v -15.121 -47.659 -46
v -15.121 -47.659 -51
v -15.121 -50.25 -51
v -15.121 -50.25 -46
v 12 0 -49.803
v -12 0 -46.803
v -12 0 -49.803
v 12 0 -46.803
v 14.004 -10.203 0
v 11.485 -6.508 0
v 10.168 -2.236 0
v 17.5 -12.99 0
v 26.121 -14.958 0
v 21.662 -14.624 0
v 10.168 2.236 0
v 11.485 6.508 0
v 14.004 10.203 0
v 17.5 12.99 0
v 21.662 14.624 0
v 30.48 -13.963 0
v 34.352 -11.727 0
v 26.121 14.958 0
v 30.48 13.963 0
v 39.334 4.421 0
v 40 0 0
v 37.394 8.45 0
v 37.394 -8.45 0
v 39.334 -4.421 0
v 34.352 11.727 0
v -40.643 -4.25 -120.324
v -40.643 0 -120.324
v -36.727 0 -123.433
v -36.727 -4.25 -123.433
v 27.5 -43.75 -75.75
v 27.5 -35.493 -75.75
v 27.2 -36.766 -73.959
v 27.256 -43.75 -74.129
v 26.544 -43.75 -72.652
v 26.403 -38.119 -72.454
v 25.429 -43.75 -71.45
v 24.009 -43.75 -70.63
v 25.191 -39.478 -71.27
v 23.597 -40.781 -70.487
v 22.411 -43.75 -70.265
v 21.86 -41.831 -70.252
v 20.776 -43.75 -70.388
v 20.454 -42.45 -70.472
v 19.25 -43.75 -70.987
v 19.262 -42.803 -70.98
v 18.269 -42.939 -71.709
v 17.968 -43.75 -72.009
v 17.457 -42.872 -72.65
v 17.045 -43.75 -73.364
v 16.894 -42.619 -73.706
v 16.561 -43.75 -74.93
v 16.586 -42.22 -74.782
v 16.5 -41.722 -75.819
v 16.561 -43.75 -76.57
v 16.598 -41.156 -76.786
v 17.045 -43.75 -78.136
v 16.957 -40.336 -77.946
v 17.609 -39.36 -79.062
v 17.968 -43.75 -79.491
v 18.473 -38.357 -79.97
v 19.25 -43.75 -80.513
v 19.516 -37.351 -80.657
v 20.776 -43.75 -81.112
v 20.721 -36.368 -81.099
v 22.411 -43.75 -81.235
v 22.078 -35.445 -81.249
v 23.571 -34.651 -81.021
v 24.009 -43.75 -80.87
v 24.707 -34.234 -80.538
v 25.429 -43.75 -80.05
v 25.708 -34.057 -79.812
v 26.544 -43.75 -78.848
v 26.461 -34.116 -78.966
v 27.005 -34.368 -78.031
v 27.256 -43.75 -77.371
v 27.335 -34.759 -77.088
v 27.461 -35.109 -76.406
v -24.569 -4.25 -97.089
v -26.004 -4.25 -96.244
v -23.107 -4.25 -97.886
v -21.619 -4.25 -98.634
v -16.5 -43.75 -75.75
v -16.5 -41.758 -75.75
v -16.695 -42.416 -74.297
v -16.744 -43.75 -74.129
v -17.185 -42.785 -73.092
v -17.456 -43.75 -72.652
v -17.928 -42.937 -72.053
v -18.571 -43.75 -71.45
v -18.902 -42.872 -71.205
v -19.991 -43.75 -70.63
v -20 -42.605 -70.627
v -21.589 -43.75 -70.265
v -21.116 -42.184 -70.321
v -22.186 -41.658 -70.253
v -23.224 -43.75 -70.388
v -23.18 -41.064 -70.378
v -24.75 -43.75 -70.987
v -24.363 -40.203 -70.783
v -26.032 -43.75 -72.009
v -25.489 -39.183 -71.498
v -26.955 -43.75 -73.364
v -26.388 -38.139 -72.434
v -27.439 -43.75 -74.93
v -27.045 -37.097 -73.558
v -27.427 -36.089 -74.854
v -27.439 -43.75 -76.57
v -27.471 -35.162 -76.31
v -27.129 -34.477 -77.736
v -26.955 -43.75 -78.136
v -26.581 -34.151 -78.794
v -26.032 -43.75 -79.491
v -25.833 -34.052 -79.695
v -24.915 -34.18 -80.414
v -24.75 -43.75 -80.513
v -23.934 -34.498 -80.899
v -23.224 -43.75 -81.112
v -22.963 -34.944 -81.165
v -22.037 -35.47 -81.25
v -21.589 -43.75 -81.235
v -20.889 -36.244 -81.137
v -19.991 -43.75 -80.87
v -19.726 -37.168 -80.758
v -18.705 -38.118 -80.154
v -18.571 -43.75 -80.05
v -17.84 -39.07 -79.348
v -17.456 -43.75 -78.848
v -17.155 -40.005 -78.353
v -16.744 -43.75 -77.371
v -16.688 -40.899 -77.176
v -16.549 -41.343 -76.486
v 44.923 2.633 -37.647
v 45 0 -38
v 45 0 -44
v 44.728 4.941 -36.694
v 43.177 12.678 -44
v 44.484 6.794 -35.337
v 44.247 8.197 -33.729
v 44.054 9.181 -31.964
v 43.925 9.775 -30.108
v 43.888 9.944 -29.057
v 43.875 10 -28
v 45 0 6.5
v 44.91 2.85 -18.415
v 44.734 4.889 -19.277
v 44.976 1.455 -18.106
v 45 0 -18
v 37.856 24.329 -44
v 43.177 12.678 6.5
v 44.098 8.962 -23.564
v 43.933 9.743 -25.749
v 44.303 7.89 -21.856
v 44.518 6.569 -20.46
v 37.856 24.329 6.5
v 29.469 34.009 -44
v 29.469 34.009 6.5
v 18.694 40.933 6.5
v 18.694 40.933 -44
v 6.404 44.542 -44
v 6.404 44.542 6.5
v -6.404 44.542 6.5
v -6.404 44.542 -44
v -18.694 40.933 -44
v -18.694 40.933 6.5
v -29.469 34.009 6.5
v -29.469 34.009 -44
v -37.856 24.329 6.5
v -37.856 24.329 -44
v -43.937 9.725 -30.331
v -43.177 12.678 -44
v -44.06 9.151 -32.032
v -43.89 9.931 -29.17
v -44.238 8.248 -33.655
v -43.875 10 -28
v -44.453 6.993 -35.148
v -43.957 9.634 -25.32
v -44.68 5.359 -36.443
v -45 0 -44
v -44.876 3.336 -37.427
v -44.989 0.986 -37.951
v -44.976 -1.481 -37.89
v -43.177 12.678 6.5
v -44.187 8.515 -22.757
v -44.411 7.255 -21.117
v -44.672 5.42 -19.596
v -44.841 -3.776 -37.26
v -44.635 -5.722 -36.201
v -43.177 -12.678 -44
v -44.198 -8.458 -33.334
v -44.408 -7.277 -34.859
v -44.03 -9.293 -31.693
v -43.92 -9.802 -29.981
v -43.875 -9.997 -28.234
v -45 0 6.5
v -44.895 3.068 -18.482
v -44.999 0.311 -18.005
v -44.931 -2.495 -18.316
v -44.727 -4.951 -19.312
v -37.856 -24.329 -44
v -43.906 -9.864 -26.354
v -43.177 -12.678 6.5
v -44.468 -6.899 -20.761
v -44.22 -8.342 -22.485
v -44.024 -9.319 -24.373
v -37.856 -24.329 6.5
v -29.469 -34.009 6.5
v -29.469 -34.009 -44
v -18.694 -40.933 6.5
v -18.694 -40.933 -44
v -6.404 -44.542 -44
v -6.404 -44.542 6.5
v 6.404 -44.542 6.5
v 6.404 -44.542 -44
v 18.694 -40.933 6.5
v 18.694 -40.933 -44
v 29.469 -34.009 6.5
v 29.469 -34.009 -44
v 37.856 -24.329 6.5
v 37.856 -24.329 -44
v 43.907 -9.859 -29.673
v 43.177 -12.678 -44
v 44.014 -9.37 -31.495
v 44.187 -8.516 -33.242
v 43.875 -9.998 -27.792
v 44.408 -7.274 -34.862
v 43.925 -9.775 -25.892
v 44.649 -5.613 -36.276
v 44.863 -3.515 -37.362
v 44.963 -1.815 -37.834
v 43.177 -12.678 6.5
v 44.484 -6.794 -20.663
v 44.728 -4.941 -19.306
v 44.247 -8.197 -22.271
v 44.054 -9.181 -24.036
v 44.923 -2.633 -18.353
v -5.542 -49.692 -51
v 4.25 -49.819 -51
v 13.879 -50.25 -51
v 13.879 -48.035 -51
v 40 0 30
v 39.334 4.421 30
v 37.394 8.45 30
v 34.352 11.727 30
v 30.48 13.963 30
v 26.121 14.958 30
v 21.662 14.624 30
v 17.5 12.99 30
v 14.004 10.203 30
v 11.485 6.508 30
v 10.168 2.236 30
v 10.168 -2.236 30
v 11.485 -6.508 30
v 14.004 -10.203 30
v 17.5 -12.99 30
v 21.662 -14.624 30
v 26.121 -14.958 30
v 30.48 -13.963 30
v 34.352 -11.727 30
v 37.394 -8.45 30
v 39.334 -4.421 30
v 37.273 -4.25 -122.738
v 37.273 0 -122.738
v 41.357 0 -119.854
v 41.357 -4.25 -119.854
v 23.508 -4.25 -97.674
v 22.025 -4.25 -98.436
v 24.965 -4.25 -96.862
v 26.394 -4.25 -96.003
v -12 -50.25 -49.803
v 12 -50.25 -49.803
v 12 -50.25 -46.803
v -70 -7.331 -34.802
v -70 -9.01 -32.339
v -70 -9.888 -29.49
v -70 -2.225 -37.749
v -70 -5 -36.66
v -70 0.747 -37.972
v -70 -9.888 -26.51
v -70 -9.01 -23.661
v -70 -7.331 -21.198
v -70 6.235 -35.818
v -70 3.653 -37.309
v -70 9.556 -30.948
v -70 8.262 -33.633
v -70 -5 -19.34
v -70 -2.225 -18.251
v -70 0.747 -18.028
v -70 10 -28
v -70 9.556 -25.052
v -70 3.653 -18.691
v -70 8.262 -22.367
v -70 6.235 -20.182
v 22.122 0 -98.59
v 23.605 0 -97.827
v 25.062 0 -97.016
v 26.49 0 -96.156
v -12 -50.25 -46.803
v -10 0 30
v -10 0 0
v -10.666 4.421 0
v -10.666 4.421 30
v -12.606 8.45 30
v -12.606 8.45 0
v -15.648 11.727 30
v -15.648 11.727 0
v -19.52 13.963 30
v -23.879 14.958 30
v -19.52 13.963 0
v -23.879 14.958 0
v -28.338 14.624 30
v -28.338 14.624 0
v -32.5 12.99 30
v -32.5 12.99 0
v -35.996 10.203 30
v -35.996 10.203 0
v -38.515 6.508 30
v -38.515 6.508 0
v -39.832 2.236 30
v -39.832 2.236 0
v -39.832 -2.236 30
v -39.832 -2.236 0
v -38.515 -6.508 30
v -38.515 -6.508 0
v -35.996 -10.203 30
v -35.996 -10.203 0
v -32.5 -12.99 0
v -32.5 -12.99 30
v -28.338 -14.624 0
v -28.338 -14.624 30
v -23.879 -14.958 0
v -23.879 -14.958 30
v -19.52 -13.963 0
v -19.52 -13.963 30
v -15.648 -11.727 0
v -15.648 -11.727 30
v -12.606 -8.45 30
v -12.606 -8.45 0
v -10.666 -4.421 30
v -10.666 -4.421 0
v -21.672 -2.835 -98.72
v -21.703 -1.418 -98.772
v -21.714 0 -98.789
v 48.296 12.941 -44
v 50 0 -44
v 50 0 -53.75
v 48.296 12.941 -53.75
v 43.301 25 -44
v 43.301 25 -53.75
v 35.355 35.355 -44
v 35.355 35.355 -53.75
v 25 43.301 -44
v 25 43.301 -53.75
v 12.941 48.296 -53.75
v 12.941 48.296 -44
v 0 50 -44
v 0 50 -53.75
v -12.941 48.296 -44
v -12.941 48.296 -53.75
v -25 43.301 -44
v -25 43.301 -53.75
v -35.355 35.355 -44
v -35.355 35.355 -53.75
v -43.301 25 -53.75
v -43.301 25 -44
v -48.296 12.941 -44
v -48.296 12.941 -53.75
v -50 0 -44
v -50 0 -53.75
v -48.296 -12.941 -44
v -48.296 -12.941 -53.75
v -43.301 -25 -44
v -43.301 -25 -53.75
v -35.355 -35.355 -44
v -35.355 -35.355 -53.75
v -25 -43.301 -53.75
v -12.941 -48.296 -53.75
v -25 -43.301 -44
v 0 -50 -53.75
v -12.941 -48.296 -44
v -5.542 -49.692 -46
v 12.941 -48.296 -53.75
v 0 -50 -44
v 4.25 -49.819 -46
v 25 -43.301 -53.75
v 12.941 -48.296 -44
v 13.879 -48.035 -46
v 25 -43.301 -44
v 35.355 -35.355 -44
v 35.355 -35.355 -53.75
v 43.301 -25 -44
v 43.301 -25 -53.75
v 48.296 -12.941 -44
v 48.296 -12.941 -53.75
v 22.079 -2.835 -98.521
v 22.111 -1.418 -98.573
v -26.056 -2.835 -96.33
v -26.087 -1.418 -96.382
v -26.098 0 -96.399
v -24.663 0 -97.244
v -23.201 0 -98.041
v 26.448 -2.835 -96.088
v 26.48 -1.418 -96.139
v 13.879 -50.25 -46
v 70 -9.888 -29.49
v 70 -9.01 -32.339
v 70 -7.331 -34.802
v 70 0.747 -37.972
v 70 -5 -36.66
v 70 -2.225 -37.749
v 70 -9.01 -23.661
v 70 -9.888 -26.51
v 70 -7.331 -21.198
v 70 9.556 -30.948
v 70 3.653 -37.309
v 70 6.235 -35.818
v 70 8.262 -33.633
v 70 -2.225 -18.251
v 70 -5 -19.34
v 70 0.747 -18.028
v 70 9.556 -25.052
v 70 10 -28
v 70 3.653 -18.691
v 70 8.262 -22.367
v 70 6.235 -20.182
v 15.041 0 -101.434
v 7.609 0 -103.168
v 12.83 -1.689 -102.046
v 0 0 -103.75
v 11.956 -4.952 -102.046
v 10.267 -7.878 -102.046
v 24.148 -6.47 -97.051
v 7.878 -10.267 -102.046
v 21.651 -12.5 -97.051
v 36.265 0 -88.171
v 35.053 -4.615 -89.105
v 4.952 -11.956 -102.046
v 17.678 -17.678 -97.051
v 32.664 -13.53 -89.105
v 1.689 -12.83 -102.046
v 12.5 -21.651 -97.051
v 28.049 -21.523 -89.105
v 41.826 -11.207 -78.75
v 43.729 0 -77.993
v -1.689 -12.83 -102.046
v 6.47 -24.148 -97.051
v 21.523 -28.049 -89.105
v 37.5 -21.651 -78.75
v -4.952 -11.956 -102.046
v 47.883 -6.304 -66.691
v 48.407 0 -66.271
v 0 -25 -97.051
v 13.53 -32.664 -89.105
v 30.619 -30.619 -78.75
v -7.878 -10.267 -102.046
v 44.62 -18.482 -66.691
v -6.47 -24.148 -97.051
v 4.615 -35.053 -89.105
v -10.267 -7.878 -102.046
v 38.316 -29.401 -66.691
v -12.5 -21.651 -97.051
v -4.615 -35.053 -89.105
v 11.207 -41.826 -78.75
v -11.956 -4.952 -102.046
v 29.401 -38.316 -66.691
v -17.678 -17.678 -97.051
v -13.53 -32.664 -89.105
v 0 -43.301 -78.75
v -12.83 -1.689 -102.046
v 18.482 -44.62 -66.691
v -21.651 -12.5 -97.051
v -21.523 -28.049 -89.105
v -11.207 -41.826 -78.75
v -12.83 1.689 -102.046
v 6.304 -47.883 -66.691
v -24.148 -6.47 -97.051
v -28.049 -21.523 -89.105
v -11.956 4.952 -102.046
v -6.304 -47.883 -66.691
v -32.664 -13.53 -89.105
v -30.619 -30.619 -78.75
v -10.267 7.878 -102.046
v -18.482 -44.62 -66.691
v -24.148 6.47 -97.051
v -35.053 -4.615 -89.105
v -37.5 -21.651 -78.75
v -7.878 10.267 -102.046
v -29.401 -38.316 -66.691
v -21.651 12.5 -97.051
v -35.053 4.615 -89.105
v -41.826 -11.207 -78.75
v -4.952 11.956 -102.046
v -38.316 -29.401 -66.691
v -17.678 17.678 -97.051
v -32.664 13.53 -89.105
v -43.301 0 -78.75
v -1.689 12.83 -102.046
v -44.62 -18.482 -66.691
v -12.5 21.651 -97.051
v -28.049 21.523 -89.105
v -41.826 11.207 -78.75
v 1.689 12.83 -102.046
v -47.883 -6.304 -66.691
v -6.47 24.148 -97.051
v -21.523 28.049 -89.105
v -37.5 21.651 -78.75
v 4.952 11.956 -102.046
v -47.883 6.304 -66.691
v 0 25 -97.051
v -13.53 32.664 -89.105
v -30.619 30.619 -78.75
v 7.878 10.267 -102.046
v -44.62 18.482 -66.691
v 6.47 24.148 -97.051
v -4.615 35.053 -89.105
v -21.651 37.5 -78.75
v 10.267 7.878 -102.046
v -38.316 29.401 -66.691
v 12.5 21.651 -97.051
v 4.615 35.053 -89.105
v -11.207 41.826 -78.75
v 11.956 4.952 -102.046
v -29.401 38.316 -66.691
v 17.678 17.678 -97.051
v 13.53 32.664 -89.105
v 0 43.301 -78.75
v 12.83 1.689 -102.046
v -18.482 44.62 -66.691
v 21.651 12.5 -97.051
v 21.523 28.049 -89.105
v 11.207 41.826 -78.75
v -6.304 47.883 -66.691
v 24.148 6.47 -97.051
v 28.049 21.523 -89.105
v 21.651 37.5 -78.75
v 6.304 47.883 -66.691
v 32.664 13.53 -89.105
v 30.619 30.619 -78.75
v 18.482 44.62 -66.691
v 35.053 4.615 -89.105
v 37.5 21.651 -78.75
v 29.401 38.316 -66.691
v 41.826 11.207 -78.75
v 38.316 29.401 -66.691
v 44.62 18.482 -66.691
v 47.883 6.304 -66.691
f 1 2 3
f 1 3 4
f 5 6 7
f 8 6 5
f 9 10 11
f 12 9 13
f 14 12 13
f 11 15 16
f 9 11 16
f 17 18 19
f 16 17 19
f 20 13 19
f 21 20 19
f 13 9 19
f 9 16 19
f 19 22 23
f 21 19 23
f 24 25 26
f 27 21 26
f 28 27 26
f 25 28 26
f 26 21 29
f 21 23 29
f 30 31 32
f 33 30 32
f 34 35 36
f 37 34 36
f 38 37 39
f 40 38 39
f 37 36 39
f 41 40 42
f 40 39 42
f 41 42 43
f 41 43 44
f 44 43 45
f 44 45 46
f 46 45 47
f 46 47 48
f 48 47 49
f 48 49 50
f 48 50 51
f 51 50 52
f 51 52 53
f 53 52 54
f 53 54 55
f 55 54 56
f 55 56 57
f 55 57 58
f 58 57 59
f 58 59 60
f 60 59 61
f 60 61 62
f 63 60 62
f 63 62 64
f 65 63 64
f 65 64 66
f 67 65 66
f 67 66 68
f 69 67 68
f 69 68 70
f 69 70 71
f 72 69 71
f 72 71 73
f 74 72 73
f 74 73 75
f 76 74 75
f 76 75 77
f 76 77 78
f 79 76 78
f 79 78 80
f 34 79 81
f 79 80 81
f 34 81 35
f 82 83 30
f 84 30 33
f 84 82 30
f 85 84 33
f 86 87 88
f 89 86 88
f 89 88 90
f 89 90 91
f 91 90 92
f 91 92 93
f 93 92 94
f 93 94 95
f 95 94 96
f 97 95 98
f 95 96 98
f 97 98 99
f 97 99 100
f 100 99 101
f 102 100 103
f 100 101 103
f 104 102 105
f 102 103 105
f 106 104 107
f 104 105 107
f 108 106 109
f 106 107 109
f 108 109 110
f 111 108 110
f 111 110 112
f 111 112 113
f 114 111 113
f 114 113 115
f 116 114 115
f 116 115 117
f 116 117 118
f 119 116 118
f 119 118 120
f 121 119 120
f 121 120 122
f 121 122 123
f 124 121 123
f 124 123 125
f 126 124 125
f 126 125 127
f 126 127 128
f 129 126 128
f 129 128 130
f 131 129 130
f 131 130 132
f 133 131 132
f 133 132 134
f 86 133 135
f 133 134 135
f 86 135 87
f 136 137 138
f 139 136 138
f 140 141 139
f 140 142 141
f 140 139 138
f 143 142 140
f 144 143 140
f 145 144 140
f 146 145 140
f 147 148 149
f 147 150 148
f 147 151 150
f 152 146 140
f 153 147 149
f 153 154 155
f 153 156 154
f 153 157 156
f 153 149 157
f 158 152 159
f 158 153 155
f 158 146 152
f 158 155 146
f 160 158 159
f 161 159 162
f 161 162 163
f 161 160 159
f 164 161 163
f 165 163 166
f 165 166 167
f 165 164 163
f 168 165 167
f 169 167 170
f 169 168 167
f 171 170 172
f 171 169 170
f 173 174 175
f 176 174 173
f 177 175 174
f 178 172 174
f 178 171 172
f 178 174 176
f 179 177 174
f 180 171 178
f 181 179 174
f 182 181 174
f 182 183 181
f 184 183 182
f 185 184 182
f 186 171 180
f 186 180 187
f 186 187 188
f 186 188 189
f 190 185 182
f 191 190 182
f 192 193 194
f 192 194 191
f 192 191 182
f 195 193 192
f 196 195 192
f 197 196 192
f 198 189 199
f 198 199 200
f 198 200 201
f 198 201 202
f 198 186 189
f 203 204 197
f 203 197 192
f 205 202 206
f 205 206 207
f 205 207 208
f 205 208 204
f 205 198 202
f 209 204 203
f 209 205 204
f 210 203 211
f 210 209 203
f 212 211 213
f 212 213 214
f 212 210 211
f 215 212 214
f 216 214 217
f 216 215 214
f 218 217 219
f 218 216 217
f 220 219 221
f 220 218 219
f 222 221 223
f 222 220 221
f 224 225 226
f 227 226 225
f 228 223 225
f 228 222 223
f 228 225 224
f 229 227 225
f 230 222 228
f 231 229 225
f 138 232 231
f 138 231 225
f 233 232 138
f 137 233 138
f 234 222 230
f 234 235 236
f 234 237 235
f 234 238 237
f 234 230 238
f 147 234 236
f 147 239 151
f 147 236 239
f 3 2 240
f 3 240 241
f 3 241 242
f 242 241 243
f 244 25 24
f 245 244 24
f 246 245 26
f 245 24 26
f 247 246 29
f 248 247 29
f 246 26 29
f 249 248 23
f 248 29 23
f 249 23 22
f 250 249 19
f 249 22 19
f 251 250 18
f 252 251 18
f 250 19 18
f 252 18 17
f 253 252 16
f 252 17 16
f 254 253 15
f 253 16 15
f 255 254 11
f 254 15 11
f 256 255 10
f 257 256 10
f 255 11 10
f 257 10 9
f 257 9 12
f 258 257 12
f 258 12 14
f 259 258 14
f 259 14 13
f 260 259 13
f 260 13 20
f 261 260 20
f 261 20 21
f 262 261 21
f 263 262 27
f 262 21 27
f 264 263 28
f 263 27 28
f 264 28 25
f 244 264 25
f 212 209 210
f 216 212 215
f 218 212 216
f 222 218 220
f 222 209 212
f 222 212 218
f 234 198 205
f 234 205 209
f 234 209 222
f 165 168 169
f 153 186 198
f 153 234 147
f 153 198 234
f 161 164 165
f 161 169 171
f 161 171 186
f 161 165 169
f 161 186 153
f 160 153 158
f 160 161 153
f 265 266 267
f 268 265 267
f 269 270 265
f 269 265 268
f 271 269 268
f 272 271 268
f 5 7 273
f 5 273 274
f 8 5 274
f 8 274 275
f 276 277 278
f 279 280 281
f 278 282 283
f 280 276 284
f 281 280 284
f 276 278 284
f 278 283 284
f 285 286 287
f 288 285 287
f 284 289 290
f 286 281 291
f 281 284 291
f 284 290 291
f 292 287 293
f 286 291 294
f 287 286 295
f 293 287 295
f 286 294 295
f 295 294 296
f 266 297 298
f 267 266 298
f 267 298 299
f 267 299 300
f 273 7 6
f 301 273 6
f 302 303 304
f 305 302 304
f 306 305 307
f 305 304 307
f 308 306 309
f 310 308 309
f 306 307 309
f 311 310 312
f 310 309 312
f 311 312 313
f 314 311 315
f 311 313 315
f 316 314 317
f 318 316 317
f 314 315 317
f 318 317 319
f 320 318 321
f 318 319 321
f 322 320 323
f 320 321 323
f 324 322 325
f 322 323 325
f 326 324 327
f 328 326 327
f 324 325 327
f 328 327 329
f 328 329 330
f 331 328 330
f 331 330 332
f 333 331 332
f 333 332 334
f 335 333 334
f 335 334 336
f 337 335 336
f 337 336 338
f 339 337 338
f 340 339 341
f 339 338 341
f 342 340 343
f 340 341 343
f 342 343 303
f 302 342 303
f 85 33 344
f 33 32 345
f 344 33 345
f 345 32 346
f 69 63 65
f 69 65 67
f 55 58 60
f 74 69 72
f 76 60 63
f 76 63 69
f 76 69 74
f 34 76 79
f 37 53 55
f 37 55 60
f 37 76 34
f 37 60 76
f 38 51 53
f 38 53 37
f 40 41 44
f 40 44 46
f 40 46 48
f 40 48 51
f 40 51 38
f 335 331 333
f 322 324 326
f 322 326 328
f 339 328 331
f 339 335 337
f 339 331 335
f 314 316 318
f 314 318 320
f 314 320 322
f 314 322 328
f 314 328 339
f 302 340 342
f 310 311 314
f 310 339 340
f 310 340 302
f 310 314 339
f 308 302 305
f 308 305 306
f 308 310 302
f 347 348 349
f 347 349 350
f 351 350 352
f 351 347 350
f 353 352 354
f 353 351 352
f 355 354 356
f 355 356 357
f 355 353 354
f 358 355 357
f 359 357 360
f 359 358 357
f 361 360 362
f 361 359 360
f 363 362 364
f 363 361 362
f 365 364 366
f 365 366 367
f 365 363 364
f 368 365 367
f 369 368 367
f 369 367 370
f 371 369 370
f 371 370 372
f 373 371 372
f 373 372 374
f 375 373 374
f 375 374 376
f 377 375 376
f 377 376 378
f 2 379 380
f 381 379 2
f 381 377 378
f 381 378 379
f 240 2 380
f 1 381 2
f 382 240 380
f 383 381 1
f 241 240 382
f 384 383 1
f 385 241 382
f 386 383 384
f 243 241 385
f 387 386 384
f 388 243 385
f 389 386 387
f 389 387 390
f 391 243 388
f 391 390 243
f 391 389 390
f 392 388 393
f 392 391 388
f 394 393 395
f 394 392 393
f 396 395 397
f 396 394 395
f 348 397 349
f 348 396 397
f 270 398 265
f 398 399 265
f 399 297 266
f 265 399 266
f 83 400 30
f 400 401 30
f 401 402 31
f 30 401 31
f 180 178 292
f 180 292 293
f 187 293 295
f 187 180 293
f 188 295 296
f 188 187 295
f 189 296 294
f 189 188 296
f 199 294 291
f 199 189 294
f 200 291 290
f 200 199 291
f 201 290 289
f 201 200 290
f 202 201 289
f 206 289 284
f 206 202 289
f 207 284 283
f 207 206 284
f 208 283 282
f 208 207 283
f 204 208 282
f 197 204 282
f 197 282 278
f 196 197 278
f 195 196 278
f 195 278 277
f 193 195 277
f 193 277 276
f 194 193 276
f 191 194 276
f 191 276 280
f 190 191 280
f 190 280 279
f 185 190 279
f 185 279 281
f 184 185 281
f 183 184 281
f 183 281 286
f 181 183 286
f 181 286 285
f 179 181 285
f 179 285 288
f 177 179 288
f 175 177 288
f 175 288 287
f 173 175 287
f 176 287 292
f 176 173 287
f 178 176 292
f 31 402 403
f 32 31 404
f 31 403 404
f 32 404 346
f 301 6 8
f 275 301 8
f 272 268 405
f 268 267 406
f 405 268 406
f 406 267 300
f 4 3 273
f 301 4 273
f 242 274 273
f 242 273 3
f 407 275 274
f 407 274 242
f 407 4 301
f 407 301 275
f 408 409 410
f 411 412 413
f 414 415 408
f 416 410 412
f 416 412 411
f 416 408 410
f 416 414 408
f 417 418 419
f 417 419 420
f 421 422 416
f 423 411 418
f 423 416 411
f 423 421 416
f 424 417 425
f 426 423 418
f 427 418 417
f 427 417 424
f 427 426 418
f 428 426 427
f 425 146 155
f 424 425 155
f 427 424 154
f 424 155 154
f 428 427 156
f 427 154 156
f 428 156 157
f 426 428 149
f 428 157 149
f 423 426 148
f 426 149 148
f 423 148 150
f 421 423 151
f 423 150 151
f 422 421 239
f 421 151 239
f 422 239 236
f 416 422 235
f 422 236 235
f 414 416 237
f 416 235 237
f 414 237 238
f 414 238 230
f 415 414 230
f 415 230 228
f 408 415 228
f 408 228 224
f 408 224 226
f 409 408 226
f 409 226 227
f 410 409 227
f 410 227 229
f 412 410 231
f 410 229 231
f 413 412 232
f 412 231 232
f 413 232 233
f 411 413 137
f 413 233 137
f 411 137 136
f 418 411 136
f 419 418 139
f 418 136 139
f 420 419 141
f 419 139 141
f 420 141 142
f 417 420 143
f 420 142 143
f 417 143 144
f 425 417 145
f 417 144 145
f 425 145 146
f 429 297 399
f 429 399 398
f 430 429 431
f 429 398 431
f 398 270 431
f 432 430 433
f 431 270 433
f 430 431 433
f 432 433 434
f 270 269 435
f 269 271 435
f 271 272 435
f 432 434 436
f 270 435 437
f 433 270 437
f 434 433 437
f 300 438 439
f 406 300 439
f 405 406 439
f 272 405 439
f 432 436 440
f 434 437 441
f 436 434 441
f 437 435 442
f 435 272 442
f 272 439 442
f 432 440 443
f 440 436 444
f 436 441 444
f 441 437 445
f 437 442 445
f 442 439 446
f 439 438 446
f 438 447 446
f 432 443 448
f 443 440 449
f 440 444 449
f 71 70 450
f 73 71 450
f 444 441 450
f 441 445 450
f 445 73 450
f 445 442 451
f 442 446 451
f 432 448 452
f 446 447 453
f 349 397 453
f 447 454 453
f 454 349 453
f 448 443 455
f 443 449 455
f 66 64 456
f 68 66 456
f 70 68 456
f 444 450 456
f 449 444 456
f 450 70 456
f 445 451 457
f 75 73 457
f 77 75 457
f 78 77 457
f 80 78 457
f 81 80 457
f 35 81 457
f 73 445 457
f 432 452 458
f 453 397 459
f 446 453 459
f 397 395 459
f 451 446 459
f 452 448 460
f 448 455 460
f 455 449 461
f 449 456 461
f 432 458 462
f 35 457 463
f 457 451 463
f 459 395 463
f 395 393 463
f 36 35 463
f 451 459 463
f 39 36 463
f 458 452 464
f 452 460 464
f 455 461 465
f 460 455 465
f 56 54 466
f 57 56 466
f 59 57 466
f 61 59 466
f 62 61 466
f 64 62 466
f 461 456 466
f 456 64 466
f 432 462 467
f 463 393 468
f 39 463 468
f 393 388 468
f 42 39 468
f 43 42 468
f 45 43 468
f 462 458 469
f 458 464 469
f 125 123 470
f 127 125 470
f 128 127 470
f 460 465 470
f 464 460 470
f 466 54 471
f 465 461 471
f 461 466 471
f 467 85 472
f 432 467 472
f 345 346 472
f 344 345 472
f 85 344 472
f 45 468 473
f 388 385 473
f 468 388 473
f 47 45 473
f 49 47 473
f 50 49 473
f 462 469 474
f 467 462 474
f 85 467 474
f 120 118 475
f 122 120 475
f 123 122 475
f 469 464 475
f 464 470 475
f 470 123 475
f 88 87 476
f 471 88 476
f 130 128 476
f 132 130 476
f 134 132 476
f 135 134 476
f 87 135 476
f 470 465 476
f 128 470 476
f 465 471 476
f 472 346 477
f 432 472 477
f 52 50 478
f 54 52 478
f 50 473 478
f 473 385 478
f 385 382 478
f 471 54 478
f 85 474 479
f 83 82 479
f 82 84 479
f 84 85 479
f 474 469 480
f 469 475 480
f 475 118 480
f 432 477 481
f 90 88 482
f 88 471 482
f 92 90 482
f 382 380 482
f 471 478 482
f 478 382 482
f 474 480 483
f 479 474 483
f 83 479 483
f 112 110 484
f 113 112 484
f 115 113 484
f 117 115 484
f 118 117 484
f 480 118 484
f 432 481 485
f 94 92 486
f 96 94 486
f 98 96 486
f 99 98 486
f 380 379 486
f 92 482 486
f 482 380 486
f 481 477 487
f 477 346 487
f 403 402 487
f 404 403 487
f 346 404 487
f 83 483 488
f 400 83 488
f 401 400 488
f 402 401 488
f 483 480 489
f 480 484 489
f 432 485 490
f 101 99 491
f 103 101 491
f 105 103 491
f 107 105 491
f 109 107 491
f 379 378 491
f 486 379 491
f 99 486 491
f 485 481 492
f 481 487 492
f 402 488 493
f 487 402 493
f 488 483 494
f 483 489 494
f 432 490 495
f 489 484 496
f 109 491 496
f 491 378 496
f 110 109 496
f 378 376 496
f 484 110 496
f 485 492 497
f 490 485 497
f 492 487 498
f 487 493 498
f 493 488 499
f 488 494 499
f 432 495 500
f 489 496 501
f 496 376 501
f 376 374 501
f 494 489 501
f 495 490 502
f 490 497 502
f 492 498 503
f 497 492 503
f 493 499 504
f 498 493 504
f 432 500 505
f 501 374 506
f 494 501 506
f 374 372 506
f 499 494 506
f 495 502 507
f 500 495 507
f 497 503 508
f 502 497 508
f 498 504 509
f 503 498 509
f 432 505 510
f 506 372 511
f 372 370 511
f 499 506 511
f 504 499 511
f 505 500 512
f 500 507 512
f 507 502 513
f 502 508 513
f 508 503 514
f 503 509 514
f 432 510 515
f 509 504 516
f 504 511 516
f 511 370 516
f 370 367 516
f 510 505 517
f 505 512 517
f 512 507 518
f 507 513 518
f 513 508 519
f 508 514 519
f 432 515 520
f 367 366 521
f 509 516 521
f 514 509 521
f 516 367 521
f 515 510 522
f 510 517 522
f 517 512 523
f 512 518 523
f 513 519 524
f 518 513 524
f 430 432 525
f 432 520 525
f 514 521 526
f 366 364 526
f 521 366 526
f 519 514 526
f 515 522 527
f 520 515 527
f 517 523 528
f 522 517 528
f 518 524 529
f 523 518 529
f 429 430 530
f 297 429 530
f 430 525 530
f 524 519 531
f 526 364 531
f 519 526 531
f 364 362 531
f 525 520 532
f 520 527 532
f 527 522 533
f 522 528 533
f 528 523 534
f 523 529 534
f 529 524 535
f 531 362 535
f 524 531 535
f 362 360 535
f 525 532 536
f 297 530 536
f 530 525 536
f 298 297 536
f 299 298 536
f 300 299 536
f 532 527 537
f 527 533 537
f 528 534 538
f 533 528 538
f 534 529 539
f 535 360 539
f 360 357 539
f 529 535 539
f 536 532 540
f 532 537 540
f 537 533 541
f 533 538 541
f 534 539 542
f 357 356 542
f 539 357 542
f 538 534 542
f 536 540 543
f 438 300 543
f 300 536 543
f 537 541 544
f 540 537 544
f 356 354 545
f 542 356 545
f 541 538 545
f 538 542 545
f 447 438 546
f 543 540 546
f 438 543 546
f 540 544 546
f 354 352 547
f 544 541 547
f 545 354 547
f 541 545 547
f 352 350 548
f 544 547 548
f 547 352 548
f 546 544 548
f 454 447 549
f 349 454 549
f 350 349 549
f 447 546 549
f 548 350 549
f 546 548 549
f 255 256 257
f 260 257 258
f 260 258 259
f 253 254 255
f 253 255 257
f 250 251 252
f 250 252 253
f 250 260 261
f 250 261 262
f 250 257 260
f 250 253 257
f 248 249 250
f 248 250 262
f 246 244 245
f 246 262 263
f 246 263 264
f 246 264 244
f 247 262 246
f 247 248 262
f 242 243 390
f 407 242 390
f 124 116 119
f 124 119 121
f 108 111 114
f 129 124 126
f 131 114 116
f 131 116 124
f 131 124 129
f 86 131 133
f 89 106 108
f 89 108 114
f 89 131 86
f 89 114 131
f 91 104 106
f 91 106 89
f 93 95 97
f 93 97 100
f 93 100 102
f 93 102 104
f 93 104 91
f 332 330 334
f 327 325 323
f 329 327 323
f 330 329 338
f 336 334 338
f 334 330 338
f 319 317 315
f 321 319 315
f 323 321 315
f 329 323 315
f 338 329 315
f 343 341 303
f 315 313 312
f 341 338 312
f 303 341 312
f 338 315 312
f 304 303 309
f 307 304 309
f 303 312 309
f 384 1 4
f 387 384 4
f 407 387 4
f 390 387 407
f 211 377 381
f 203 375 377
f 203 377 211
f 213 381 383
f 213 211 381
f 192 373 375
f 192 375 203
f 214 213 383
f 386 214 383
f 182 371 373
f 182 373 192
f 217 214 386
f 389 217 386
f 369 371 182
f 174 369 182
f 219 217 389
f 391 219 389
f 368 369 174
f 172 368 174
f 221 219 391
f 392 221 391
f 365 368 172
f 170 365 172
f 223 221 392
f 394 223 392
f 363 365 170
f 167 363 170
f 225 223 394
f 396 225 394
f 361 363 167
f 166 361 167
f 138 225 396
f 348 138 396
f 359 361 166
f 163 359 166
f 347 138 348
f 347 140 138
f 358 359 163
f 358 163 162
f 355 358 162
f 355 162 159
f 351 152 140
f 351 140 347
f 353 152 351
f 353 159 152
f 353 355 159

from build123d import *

# Parameters (mm, degrees)
F0_R          = 15
F3_DEPTH      = 30
F1_R          = 45
F4_DEPTH      = 50
F4_DEPTH_BACK = 6.5
F5_START      = -44
F2_R          = 50
F5_DEPTH      = 9.75
F6_R          = 10
F7_DEPTH      = 70
F8_R          = 10
F9_DEPTH      = 70
F12_R         = 5.5
F13_DEPTH     = 43.75
F15_DEPTH     = 4.25
F16_W         = 29
F16_H         = 5
F17_DEPTH     = 50.25
F18_W         = 24
F18_H         = 3
F19_DEPTH     = 52


with BuildPart() as f3:
    # F0 (on Top) → F3 (new body)
    with BuildSketch(Plane.XY):
        with Locations((-25, 0)):
            Circle(F0_R)
    extrude(amount=F3_DEPTH)


with BuildPart() as f3b:
    # F0 (on Top) → F3, piece 2 (new body)
    with BuildSketch(Plane.XY):
        with Locations((25, 0)):
            Circle(F0_R)
    extrude(amount=F3_DEPTH)


with BuildPart() as f4:
    # F1 (on Top) → F4 (new body, two sides)
    with BuildSketch(Plane.XY) as f4_sk:
        Circle(F1_R)
    extrude(amount=-F4_DEPTH)
    extrude(f4_sk.sketch, amount=F4_DEPTH_BACK)

    # F2 (on Top) → F5 (join)
    with BuildSketch(Plane.XY.offset(F5_START)):
        Circle(F2_R)
    extrude(amount=-F5_DEPTH)

    # F6 (on Right) → F7 (join)
    with BuildSketch(Plane.YZ):
        with Locations((0, -28)):
            Circle(F6_R)
    extrude(amount=F7_DEPTH)

    # F8 (on Right) → F9 (join)
    with BuildSketch(Plane.YZ):
        with Locations((0, -28)):
            Circle(F8_R)
    extrude(amount=-F9_DEPTH)

    # F10 (on Front) → F11 (revolve)
    with BuildSketch(Plane.XZ):
        with BuildLine():
            Line((0, -53.75), (0, -103.75))
            ThreePointArc((0, -103.75), (35.3553390593, -89.1053390593), (50, -53.75))
            Line((50, -53.75), (0, -53.75))
        make_face()
    revolve(axis=Axis((0, 0, -78.75), (0, 0, -1)))

    # F12 (on Front) → F13 (join)
    with BuildSketch(Plane.XZ):
        with Locations((22, -75.75)):
            Circle(F12_R)
        with Locations((-22, -75.75)):
            Circle(F12_R)
    extrude(amount=F13_DEPTH)

    # F14 (on Front) → F15 (join)
    with BuildSketch(Plane.XZ):
        Polygon((37.273382177, -122.7384150805), (41.3573574255, -119.8537753855), (25.9457886256, -95.2878732623), (21.5874810644, -97.7384150805), align=None)
        Polygon((-40.6426425745, -120.3244923925), (-36.726617823, -123.4333105193), (-21.49733765, -98.4333105193), (-25.5781691914, -95.5442252089), align=None)
    extrude(amount=F15_DEPTH)

    # F16 (on Front) → F17 (join)
    with BuildSketch(Plane.XZ):
        with Locations((-0.6209718995, -48.5)):
            Rectangle(F16_W, F16_H)
    extrude(amount=F17_DEPTH)

    # F18 (on Front) → F19 (cut)
    with BuildSketch(Plane.XZ):
        with Locations((0, -48.3026781332)):
            Rectangle(F18_W, F18_H)
    extrude(amount=F19_DEPTH, mode=Mode.SUBTRACT)


solid = Compound([f3.part, f3b.part, f4.part])
